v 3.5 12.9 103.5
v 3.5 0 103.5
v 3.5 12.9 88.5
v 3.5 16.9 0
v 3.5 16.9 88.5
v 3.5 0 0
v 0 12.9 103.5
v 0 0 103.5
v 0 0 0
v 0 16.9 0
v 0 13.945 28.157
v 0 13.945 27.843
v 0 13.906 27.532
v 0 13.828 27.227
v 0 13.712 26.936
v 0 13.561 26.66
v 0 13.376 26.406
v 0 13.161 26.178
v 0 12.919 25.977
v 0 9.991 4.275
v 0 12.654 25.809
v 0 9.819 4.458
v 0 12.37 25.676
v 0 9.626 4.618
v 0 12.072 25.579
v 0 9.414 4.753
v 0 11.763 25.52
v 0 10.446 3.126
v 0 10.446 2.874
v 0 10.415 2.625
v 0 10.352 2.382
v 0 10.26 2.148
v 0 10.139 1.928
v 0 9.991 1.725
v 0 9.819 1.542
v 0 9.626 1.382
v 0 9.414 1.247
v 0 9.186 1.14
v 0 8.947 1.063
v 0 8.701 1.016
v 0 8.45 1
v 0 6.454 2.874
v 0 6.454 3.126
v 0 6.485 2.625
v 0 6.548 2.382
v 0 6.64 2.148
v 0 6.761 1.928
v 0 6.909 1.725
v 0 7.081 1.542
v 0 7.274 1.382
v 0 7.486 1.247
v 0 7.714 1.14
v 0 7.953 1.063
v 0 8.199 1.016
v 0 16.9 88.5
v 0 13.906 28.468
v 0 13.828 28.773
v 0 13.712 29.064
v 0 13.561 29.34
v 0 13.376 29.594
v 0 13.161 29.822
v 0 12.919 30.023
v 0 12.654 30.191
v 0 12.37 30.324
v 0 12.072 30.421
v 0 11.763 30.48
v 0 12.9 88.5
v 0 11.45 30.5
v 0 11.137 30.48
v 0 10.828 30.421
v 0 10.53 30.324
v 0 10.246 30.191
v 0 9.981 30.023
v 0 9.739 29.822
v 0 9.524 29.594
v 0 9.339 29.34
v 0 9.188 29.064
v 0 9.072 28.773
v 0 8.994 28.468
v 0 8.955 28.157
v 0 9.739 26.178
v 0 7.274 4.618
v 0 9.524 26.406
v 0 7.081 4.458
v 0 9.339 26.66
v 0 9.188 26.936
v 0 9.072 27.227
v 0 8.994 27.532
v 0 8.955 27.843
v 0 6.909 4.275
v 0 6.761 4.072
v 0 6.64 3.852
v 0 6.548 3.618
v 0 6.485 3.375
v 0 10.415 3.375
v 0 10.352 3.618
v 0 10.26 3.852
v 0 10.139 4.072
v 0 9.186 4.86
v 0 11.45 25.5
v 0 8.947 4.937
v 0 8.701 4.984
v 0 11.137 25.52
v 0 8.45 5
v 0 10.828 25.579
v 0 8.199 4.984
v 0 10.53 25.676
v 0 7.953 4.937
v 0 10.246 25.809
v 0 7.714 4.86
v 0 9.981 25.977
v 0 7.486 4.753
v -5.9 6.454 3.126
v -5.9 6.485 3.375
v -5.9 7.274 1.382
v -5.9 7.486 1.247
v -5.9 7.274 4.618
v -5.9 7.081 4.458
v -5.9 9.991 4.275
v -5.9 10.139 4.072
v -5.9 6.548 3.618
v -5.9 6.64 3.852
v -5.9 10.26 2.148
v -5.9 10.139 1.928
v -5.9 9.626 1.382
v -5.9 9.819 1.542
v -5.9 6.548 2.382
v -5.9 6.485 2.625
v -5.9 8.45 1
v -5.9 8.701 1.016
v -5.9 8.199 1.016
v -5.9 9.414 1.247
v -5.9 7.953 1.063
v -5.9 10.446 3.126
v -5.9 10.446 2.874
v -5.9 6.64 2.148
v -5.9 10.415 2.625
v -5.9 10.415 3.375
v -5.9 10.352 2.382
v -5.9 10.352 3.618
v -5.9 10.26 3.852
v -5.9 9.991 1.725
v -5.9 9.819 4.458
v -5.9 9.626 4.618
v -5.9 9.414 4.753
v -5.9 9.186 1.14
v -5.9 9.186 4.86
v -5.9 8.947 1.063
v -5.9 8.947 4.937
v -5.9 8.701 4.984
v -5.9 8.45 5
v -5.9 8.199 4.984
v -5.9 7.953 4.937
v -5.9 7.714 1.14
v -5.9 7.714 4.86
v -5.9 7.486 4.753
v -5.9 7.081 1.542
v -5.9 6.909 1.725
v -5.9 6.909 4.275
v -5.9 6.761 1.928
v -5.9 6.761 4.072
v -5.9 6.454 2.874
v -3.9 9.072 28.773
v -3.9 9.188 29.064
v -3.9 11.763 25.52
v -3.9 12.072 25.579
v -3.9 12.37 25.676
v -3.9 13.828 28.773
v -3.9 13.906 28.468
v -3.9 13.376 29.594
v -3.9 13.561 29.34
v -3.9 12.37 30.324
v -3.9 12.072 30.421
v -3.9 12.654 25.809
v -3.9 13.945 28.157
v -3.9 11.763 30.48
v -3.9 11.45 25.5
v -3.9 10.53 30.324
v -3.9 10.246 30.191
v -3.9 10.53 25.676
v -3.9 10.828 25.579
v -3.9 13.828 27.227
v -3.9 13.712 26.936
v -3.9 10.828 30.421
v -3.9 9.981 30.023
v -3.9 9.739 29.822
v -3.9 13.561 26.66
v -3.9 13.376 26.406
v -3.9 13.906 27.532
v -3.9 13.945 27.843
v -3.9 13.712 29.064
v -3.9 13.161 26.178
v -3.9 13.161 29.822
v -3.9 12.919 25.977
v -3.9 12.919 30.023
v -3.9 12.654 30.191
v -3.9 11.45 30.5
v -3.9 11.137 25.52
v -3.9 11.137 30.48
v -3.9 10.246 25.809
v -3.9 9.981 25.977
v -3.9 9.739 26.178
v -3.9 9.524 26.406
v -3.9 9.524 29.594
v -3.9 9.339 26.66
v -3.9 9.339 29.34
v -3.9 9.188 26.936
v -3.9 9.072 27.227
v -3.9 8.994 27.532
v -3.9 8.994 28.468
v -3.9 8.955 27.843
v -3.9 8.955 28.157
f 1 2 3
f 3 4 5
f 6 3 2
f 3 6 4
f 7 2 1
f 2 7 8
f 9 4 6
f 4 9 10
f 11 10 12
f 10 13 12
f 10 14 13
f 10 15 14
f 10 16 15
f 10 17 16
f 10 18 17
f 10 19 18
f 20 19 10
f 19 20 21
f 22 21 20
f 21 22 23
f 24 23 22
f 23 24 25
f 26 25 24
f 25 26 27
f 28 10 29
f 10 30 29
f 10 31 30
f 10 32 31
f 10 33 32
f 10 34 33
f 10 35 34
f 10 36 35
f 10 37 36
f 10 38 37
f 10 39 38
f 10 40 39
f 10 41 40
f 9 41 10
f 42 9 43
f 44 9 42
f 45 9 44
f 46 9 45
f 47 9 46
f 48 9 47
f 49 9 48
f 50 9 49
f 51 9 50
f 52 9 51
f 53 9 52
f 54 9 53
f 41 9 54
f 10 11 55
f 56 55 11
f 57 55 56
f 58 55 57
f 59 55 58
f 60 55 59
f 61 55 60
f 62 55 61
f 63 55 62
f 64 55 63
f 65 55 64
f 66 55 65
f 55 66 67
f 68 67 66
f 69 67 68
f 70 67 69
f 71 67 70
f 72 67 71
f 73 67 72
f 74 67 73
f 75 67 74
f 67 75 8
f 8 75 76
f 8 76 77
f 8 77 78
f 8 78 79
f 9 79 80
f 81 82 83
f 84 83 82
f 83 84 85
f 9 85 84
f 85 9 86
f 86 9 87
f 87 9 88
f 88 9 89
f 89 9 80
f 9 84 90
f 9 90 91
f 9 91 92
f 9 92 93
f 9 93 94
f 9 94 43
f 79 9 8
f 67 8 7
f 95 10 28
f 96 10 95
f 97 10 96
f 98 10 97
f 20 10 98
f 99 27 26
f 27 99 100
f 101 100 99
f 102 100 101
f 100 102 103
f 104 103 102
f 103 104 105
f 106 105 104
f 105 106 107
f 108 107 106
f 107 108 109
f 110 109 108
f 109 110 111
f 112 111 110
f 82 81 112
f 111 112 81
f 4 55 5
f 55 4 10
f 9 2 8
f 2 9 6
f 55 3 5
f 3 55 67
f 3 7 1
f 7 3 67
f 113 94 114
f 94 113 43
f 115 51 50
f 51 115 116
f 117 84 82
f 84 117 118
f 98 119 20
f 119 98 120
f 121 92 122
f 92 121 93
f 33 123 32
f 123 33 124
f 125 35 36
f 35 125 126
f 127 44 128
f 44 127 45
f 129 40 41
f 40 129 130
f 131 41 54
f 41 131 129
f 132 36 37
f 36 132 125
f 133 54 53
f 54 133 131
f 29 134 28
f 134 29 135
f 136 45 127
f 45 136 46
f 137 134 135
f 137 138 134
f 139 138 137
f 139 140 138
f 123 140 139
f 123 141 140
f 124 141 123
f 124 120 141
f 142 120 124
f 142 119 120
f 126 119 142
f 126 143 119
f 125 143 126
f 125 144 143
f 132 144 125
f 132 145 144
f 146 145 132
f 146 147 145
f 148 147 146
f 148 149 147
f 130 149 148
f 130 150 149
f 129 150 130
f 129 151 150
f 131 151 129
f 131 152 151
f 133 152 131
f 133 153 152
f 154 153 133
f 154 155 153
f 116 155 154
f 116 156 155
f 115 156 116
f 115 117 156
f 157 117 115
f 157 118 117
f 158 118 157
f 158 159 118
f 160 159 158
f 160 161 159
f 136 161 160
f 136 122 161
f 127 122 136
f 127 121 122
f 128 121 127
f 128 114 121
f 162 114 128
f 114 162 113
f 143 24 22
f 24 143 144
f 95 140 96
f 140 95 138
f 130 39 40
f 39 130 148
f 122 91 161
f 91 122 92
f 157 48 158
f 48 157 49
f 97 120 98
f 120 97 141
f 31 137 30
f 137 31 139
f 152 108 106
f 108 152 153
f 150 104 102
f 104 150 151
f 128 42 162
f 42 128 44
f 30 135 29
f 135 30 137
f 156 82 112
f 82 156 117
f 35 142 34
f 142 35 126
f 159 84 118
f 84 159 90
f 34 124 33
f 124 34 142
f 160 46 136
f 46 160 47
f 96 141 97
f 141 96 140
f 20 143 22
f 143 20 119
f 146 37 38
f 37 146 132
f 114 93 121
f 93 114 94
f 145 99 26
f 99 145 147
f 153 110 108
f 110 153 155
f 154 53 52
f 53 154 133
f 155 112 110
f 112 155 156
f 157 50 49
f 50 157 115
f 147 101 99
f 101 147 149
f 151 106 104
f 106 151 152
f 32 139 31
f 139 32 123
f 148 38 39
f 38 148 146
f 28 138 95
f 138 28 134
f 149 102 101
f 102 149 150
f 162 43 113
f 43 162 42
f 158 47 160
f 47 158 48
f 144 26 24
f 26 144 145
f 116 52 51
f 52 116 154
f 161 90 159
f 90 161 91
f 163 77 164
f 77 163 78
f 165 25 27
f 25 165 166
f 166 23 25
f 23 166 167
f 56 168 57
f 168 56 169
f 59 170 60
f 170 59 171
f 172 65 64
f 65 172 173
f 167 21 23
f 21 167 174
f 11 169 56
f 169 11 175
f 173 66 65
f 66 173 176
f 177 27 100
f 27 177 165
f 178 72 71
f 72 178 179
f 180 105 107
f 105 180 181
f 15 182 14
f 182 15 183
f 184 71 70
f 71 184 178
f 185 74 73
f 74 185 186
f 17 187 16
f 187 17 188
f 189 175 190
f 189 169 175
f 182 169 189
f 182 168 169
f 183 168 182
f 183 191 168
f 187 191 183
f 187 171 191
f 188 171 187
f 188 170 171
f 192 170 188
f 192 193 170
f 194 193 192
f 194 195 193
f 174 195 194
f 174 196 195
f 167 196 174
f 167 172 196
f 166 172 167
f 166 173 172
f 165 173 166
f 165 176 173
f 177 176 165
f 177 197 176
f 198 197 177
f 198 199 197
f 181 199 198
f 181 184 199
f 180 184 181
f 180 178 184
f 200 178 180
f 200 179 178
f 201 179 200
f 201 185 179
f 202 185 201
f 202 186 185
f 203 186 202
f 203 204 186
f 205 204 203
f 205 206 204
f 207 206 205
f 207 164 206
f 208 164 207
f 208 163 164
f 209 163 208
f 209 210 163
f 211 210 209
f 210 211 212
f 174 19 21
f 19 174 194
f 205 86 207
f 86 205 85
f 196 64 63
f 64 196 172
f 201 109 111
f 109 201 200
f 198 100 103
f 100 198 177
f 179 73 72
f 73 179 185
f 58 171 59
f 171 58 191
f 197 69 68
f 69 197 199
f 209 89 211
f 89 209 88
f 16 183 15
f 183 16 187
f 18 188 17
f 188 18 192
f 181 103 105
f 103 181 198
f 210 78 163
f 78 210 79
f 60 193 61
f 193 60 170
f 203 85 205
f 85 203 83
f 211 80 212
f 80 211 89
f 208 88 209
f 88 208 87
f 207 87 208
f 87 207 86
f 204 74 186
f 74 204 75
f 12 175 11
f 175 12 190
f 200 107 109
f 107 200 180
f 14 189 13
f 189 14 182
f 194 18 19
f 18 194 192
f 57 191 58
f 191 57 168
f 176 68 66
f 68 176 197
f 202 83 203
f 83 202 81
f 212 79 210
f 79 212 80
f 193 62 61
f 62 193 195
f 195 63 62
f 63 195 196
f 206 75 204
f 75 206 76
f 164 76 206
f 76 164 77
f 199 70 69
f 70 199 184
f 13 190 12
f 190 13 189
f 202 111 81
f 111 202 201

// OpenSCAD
// file: Adapter_config.scad
adaptateur_ep = (300.5-286.5)/4;
adaptateur_ht = 103.5;
adaptateur_pf = 16.90;

onglet_ht = 15;
onglet_ep = 4;
onglet_ec = 2.5;

$fn = 50;
// main file
include <Adapter_config.scad>;

module adaptateur_droit_int()
{
    cyl1_dm = 4;
    cyl1_ht = 6;
    cyl1_att_ht = 3;
    cyl1_att_dc = 0;

    cyl2_dm = 5;
    cyl2_ht = 4;
    cyl2_att_ht = 28;
    cyl2_att_dc = 3;

    union()
    {
        difference()
        {
            cube([adaptateur_ep, adaptateur_pf, adaptateur_ht]);
            
            color("orange")
            translate([-0.1,adaptateur_pf-onglet_ep,adaptateur_ht-onglet_ht])
            cube([adaptateur_ep+0.2,onglet_ep+0.1,onglet_ht+0.1]);
        }
        
        color("black")
        translate([-cyl1_ht+0.1,adaptateur_pf/2+cyl1_att_dc,cyl1_att_ht])
        rotate([0,90,0])
        cylinder(d=cyl1_dm, h=cyl1_ht);
        
        color("blue")
        translate([-cyl2_ht+0.1,adaptateur_pf/2+cyl2_att_dc,cyl2_att_ht])
        rotate([0,90,0])
        cylinder(d=cyl2_dm, h=cyl2_ht);
    }
}

adaptateur_droit_int();
